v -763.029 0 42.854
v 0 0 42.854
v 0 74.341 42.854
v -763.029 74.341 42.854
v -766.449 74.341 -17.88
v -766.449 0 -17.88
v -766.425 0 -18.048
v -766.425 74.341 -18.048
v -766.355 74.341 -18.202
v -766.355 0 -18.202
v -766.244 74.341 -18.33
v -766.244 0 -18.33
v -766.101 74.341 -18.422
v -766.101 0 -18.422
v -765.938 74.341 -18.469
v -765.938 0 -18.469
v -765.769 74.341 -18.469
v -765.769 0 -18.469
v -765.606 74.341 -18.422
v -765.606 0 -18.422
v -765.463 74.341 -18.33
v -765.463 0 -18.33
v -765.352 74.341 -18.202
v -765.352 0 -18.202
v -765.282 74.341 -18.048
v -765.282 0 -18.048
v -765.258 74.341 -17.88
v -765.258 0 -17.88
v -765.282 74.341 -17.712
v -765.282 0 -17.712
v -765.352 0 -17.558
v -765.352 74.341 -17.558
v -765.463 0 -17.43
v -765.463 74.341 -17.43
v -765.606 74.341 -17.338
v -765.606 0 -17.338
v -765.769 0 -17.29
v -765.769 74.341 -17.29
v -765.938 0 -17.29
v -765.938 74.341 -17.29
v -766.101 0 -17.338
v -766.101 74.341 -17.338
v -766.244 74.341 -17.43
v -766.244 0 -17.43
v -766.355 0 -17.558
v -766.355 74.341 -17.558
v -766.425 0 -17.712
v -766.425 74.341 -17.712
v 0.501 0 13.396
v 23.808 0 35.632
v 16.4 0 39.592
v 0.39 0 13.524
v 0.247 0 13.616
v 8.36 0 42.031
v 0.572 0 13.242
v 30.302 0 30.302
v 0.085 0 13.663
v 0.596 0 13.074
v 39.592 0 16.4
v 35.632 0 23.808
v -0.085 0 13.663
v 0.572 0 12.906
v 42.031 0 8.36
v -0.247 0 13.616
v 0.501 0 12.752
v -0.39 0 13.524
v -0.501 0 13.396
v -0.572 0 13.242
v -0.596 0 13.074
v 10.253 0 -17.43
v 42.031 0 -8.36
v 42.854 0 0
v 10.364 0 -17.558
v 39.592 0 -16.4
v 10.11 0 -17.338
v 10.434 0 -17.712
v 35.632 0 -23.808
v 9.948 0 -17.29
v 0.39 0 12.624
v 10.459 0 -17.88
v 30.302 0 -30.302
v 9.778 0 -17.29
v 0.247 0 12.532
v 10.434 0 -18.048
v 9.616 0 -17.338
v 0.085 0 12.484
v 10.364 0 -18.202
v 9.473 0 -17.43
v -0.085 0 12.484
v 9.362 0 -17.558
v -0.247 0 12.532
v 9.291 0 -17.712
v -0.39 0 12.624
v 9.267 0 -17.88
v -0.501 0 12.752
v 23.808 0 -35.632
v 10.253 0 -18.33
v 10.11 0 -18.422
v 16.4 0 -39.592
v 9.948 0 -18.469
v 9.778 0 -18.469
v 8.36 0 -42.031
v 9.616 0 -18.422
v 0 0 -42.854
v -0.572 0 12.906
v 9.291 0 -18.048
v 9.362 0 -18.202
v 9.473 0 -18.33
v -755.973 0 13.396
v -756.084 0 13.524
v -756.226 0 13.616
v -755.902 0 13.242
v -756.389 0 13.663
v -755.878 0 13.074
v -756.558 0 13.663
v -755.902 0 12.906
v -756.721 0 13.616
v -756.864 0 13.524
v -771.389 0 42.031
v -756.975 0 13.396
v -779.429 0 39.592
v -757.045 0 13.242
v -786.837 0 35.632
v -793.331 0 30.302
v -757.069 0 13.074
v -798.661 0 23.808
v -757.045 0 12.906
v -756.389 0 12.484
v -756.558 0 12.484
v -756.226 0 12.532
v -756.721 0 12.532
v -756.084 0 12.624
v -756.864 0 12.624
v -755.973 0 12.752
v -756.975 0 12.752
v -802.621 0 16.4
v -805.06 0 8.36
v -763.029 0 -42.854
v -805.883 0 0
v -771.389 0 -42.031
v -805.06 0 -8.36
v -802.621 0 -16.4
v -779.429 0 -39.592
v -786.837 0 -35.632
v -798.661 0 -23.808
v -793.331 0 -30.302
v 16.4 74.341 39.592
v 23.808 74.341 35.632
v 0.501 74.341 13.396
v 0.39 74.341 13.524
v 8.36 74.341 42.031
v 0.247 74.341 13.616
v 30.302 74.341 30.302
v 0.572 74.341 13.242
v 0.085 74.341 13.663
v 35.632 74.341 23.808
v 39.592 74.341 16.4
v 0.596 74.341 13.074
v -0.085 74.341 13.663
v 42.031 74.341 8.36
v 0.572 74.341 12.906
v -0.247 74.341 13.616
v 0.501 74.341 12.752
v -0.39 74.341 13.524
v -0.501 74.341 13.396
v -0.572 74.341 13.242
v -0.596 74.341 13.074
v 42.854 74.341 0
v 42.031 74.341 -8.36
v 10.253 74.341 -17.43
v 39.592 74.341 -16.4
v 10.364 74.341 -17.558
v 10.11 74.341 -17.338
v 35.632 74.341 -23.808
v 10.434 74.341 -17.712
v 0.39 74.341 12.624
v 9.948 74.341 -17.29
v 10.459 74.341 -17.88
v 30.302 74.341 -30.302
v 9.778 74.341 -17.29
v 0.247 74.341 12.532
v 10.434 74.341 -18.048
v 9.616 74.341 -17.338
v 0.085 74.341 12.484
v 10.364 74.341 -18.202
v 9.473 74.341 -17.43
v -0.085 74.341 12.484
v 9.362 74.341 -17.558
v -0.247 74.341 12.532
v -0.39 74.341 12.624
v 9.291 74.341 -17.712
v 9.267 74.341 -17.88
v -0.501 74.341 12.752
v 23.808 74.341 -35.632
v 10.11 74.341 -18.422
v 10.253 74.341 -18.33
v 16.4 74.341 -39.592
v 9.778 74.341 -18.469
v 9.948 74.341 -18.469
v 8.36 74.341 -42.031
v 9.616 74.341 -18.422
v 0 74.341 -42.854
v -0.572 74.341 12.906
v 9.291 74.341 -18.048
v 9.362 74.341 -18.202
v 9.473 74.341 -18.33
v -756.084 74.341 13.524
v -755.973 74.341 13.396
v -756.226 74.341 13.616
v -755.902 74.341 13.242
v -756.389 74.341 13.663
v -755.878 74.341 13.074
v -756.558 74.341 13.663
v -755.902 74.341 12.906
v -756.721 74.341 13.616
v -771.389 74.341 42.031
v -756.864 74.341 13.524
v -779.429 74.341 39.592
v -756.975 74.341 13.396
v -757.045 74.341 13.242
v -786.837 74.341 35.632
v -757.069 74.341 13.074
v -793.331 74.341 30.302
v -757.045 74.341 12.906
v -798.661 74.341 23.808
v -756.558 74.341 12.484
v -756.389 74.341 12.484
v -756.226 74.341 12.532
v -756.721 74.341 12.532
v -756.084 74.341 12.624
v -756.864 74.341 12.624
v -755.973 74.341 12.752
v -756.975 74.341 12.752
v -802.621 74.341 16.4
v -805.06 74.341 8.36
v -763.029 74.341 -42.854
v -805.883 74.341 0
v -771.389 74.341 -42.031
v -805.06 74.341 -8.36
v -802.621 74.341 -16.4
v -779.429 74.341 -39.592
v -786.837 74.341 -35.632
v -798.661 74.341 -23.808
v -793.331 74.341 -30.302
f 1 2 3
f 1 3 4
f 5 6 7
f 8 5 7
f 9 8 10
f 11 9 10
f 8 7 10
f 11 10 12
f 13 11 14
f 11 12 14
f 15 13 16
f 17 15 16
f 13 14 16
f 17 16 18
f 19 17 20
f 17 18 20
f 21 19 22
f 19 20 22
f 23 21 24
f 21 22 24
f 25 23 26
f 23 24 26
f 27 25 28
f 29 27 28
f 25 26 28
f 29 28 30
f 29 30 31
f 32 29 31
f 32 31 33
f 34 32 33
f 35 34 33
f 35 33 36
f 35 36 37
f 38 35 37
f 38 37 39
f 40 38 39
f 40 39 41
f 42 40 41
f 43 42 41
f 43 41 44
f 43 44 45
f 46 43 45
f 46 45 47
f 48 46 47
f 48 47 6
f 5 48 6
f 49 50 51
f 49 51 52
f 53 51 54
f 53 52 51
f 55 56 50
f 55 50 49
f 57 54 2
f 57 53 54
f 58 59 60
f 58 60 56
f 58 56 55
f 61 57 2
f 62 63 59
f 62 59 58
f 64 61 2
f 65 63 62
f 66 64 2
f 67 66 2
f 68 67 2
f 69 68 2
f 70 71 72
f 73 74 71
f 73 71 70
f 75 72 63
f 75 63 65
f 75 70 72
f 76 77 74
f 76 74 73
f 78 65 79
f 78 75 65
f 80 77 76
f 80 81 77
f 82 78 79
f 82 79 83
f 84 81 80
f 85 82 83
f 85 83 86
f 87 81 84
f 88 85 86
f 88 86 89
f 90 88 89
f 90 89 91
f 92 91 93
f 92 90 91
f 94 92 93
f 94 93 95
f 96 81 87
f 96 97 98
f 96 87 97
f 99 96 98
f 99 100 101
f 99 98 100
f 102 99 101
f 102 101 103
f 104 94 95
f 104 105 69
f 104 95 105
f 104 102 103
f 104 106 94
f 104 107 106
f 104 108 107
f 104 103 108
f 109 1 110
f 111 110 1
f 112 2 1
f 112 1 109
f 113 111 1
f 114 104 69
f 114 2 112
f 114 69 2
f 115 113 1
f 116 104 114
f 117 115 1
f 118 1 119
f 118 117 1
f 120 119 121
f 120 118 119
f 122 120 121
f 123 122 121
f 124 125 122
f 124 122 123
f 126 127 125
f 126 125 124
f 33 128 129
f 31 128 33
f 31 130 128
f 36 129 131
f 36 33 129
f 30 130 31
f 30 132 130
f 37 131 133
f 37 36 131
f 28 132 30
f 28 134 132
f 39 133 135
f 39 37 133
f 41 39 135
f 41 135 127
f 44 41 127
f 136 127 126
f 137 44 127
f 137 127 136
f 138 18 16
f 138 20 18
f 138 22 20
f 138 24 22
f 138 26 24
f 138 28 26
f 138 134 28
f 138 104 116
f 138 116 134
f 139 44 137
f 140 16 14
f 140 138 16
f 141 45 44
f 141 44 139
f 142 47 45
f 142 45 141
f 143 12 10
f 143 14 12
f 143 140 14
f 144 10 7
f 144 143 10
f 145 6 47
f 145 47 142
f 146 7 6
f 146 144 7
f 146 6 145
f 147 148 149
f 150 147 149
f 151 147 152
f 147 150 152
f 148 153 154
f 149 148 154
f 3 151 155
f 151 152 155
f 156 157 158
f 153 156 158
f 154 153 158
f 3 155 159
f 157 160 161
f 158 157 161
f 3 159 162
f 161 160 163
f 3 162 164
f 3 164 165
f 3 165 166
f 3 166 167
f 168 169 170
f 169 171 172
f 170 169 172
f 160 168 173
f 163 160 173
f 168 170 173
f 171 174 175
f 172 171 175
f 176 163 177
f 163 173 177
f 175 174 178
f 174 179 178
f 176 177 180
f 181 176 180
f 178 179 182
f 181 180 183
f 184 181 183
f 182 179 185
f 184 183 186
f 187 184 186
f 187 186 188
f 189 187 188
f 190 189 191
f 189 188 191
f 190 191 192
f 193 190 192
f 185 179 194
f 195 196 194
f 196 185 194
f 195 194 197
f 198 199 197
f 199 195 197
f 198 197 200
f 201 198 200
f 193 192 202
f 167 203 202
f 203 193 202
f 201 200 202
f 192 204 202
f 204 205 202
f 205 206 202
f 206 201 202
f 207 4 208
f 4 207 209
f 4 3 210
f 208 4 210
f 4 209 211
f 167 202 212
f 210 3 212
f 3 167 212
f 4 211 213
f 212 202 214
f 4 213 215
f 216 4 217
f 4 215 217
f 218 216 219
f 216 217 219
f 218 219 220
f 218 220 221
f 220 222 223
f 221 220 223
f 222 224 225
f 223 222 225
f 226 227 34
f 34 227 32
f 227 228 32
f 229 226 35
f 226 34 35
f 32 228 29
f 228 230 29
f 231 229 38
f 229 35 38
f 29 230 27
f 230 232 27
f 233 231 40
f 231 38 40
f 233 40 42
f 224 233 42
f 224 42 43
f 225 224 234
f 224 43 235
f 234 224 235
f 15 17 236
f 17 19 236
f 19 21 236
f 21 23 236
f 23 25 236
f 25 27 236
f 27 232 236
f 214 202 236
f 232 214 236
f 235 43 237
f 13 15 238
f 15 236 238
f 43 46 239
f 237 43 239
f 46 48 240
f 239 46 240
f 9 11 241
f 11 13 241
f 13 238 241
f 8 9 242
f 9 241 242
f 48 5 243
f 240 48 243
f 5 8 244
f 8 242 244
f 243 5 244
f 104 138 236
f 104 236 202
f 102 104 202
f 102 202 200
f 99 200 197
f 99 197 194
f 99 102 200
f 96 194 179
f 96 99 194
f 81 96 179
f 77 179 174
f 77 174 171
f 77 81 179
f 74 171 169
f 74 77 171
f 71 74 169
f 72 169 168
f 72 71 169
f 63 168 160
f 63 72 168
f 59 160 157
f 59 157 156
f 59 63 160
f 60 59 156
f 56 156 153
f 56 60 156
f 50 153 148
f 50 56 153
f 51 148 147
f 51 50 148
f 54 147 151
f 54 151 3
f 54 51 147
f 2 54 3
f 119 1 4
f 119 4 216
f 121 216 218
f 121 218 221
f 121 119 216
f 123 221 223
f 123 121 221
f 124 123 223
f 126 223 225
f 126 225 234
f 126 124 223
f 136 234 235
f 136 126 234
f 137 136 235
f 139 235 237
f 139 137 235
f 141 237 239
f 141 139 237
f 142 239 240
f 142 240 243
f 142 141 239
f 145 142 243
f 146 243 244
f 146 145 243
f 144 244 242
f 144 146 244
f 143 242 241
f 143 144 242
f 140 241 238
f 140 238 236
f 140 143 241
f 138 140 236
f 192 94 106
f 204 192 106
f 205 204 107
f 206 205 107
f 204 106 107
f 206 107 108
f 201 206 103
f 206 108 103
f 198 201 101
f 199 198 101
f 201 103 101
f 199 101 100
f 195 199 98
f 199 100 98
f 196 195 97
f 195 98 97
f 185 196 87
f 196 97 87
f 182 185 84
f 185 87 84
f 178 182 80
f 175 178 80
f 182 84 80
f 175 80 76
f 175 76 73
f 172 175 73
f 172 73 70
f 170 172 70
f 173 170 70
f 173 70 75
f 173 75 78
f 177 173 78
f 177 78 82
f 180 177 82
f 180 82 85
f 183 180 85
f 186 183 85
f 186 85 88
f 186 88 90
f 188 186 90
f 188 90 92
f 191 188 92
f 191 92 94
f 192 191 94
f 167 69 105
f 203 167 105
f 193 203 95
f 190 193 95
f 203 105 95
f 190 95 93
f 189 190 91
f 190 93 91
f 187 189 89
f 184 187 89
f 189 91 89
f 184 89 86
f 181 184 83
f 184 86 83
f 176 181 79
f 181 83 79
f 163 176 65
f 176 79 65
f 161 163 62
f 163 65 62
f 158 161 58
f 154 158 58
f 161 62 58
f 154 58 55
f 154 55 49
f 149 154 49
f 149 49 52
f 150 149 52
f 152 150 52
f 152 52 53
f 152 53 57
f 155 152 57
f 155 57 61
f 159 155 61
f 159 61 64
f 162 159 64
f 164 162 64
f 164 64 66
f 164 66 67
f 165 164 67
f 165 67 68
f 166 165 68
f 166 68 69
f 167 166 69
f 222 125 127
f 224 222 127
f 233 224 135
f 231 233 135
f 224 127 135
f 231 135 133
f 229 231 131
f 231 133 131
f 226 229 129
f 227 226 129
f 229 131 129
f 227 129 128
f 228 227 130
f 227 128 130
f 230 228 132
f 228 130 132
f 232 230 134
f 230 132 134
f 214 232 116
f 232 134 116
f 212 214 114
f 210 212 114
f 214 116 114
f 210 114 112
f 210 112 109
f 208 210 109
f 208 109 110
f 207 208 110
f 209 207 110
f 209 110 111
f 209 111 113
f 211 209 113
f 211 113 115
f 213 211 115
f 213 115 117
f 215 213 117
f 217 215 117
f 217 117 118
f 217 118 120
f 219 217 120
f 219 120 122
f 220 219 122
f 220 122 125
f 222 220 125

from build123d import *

# Parameters (mm, degrees)
BOSS_EXTRUDE1_DEPTH   = 74.341091188
F_0_80_TAPPED_HOLE2_D = 1.19126


with BuildPart() as part:
    # Sketch1 → Boss-Extrude1 (new body)
    with BuildSketch(Plane(origin=(0, 0, 0), x_dir=(1, 0, 0), z_dir=(0, 1, 0))):
        with BuildLine():
            Line((0, -42.854004512), (-763.0290048, -42.854004512))
            ThreePointArc((-763.0290048, -42.854004512), (-805.883009312, 0), (-763.0290048, 42.854004512))
            Line((-763.0290048, 42.854004512), (0, 42.854004512))
            ThreePointArc((0, 42.854004512), (42.854004512, 0), (0, -42.854004512))
        make_face()
    extrude(amount=BOSS_EXTRUDE1_DEPTH)

    # #0-80 Tapped Hole2 (through all)
    with Locations(Plane(origin=(0, 74.341091188, 0), x_dir=(1, 0, 0), z_dir=(0, 1, 0))):
        with Locations((9.862991623, 17.879805094), (0, -13.073814135), (-765.853466012, 17.879805094), (-756.473581397, -13.073814135)):
            Hole(F_0_80_TAPPED_HOLE2_D / 2)


solid = part.part
